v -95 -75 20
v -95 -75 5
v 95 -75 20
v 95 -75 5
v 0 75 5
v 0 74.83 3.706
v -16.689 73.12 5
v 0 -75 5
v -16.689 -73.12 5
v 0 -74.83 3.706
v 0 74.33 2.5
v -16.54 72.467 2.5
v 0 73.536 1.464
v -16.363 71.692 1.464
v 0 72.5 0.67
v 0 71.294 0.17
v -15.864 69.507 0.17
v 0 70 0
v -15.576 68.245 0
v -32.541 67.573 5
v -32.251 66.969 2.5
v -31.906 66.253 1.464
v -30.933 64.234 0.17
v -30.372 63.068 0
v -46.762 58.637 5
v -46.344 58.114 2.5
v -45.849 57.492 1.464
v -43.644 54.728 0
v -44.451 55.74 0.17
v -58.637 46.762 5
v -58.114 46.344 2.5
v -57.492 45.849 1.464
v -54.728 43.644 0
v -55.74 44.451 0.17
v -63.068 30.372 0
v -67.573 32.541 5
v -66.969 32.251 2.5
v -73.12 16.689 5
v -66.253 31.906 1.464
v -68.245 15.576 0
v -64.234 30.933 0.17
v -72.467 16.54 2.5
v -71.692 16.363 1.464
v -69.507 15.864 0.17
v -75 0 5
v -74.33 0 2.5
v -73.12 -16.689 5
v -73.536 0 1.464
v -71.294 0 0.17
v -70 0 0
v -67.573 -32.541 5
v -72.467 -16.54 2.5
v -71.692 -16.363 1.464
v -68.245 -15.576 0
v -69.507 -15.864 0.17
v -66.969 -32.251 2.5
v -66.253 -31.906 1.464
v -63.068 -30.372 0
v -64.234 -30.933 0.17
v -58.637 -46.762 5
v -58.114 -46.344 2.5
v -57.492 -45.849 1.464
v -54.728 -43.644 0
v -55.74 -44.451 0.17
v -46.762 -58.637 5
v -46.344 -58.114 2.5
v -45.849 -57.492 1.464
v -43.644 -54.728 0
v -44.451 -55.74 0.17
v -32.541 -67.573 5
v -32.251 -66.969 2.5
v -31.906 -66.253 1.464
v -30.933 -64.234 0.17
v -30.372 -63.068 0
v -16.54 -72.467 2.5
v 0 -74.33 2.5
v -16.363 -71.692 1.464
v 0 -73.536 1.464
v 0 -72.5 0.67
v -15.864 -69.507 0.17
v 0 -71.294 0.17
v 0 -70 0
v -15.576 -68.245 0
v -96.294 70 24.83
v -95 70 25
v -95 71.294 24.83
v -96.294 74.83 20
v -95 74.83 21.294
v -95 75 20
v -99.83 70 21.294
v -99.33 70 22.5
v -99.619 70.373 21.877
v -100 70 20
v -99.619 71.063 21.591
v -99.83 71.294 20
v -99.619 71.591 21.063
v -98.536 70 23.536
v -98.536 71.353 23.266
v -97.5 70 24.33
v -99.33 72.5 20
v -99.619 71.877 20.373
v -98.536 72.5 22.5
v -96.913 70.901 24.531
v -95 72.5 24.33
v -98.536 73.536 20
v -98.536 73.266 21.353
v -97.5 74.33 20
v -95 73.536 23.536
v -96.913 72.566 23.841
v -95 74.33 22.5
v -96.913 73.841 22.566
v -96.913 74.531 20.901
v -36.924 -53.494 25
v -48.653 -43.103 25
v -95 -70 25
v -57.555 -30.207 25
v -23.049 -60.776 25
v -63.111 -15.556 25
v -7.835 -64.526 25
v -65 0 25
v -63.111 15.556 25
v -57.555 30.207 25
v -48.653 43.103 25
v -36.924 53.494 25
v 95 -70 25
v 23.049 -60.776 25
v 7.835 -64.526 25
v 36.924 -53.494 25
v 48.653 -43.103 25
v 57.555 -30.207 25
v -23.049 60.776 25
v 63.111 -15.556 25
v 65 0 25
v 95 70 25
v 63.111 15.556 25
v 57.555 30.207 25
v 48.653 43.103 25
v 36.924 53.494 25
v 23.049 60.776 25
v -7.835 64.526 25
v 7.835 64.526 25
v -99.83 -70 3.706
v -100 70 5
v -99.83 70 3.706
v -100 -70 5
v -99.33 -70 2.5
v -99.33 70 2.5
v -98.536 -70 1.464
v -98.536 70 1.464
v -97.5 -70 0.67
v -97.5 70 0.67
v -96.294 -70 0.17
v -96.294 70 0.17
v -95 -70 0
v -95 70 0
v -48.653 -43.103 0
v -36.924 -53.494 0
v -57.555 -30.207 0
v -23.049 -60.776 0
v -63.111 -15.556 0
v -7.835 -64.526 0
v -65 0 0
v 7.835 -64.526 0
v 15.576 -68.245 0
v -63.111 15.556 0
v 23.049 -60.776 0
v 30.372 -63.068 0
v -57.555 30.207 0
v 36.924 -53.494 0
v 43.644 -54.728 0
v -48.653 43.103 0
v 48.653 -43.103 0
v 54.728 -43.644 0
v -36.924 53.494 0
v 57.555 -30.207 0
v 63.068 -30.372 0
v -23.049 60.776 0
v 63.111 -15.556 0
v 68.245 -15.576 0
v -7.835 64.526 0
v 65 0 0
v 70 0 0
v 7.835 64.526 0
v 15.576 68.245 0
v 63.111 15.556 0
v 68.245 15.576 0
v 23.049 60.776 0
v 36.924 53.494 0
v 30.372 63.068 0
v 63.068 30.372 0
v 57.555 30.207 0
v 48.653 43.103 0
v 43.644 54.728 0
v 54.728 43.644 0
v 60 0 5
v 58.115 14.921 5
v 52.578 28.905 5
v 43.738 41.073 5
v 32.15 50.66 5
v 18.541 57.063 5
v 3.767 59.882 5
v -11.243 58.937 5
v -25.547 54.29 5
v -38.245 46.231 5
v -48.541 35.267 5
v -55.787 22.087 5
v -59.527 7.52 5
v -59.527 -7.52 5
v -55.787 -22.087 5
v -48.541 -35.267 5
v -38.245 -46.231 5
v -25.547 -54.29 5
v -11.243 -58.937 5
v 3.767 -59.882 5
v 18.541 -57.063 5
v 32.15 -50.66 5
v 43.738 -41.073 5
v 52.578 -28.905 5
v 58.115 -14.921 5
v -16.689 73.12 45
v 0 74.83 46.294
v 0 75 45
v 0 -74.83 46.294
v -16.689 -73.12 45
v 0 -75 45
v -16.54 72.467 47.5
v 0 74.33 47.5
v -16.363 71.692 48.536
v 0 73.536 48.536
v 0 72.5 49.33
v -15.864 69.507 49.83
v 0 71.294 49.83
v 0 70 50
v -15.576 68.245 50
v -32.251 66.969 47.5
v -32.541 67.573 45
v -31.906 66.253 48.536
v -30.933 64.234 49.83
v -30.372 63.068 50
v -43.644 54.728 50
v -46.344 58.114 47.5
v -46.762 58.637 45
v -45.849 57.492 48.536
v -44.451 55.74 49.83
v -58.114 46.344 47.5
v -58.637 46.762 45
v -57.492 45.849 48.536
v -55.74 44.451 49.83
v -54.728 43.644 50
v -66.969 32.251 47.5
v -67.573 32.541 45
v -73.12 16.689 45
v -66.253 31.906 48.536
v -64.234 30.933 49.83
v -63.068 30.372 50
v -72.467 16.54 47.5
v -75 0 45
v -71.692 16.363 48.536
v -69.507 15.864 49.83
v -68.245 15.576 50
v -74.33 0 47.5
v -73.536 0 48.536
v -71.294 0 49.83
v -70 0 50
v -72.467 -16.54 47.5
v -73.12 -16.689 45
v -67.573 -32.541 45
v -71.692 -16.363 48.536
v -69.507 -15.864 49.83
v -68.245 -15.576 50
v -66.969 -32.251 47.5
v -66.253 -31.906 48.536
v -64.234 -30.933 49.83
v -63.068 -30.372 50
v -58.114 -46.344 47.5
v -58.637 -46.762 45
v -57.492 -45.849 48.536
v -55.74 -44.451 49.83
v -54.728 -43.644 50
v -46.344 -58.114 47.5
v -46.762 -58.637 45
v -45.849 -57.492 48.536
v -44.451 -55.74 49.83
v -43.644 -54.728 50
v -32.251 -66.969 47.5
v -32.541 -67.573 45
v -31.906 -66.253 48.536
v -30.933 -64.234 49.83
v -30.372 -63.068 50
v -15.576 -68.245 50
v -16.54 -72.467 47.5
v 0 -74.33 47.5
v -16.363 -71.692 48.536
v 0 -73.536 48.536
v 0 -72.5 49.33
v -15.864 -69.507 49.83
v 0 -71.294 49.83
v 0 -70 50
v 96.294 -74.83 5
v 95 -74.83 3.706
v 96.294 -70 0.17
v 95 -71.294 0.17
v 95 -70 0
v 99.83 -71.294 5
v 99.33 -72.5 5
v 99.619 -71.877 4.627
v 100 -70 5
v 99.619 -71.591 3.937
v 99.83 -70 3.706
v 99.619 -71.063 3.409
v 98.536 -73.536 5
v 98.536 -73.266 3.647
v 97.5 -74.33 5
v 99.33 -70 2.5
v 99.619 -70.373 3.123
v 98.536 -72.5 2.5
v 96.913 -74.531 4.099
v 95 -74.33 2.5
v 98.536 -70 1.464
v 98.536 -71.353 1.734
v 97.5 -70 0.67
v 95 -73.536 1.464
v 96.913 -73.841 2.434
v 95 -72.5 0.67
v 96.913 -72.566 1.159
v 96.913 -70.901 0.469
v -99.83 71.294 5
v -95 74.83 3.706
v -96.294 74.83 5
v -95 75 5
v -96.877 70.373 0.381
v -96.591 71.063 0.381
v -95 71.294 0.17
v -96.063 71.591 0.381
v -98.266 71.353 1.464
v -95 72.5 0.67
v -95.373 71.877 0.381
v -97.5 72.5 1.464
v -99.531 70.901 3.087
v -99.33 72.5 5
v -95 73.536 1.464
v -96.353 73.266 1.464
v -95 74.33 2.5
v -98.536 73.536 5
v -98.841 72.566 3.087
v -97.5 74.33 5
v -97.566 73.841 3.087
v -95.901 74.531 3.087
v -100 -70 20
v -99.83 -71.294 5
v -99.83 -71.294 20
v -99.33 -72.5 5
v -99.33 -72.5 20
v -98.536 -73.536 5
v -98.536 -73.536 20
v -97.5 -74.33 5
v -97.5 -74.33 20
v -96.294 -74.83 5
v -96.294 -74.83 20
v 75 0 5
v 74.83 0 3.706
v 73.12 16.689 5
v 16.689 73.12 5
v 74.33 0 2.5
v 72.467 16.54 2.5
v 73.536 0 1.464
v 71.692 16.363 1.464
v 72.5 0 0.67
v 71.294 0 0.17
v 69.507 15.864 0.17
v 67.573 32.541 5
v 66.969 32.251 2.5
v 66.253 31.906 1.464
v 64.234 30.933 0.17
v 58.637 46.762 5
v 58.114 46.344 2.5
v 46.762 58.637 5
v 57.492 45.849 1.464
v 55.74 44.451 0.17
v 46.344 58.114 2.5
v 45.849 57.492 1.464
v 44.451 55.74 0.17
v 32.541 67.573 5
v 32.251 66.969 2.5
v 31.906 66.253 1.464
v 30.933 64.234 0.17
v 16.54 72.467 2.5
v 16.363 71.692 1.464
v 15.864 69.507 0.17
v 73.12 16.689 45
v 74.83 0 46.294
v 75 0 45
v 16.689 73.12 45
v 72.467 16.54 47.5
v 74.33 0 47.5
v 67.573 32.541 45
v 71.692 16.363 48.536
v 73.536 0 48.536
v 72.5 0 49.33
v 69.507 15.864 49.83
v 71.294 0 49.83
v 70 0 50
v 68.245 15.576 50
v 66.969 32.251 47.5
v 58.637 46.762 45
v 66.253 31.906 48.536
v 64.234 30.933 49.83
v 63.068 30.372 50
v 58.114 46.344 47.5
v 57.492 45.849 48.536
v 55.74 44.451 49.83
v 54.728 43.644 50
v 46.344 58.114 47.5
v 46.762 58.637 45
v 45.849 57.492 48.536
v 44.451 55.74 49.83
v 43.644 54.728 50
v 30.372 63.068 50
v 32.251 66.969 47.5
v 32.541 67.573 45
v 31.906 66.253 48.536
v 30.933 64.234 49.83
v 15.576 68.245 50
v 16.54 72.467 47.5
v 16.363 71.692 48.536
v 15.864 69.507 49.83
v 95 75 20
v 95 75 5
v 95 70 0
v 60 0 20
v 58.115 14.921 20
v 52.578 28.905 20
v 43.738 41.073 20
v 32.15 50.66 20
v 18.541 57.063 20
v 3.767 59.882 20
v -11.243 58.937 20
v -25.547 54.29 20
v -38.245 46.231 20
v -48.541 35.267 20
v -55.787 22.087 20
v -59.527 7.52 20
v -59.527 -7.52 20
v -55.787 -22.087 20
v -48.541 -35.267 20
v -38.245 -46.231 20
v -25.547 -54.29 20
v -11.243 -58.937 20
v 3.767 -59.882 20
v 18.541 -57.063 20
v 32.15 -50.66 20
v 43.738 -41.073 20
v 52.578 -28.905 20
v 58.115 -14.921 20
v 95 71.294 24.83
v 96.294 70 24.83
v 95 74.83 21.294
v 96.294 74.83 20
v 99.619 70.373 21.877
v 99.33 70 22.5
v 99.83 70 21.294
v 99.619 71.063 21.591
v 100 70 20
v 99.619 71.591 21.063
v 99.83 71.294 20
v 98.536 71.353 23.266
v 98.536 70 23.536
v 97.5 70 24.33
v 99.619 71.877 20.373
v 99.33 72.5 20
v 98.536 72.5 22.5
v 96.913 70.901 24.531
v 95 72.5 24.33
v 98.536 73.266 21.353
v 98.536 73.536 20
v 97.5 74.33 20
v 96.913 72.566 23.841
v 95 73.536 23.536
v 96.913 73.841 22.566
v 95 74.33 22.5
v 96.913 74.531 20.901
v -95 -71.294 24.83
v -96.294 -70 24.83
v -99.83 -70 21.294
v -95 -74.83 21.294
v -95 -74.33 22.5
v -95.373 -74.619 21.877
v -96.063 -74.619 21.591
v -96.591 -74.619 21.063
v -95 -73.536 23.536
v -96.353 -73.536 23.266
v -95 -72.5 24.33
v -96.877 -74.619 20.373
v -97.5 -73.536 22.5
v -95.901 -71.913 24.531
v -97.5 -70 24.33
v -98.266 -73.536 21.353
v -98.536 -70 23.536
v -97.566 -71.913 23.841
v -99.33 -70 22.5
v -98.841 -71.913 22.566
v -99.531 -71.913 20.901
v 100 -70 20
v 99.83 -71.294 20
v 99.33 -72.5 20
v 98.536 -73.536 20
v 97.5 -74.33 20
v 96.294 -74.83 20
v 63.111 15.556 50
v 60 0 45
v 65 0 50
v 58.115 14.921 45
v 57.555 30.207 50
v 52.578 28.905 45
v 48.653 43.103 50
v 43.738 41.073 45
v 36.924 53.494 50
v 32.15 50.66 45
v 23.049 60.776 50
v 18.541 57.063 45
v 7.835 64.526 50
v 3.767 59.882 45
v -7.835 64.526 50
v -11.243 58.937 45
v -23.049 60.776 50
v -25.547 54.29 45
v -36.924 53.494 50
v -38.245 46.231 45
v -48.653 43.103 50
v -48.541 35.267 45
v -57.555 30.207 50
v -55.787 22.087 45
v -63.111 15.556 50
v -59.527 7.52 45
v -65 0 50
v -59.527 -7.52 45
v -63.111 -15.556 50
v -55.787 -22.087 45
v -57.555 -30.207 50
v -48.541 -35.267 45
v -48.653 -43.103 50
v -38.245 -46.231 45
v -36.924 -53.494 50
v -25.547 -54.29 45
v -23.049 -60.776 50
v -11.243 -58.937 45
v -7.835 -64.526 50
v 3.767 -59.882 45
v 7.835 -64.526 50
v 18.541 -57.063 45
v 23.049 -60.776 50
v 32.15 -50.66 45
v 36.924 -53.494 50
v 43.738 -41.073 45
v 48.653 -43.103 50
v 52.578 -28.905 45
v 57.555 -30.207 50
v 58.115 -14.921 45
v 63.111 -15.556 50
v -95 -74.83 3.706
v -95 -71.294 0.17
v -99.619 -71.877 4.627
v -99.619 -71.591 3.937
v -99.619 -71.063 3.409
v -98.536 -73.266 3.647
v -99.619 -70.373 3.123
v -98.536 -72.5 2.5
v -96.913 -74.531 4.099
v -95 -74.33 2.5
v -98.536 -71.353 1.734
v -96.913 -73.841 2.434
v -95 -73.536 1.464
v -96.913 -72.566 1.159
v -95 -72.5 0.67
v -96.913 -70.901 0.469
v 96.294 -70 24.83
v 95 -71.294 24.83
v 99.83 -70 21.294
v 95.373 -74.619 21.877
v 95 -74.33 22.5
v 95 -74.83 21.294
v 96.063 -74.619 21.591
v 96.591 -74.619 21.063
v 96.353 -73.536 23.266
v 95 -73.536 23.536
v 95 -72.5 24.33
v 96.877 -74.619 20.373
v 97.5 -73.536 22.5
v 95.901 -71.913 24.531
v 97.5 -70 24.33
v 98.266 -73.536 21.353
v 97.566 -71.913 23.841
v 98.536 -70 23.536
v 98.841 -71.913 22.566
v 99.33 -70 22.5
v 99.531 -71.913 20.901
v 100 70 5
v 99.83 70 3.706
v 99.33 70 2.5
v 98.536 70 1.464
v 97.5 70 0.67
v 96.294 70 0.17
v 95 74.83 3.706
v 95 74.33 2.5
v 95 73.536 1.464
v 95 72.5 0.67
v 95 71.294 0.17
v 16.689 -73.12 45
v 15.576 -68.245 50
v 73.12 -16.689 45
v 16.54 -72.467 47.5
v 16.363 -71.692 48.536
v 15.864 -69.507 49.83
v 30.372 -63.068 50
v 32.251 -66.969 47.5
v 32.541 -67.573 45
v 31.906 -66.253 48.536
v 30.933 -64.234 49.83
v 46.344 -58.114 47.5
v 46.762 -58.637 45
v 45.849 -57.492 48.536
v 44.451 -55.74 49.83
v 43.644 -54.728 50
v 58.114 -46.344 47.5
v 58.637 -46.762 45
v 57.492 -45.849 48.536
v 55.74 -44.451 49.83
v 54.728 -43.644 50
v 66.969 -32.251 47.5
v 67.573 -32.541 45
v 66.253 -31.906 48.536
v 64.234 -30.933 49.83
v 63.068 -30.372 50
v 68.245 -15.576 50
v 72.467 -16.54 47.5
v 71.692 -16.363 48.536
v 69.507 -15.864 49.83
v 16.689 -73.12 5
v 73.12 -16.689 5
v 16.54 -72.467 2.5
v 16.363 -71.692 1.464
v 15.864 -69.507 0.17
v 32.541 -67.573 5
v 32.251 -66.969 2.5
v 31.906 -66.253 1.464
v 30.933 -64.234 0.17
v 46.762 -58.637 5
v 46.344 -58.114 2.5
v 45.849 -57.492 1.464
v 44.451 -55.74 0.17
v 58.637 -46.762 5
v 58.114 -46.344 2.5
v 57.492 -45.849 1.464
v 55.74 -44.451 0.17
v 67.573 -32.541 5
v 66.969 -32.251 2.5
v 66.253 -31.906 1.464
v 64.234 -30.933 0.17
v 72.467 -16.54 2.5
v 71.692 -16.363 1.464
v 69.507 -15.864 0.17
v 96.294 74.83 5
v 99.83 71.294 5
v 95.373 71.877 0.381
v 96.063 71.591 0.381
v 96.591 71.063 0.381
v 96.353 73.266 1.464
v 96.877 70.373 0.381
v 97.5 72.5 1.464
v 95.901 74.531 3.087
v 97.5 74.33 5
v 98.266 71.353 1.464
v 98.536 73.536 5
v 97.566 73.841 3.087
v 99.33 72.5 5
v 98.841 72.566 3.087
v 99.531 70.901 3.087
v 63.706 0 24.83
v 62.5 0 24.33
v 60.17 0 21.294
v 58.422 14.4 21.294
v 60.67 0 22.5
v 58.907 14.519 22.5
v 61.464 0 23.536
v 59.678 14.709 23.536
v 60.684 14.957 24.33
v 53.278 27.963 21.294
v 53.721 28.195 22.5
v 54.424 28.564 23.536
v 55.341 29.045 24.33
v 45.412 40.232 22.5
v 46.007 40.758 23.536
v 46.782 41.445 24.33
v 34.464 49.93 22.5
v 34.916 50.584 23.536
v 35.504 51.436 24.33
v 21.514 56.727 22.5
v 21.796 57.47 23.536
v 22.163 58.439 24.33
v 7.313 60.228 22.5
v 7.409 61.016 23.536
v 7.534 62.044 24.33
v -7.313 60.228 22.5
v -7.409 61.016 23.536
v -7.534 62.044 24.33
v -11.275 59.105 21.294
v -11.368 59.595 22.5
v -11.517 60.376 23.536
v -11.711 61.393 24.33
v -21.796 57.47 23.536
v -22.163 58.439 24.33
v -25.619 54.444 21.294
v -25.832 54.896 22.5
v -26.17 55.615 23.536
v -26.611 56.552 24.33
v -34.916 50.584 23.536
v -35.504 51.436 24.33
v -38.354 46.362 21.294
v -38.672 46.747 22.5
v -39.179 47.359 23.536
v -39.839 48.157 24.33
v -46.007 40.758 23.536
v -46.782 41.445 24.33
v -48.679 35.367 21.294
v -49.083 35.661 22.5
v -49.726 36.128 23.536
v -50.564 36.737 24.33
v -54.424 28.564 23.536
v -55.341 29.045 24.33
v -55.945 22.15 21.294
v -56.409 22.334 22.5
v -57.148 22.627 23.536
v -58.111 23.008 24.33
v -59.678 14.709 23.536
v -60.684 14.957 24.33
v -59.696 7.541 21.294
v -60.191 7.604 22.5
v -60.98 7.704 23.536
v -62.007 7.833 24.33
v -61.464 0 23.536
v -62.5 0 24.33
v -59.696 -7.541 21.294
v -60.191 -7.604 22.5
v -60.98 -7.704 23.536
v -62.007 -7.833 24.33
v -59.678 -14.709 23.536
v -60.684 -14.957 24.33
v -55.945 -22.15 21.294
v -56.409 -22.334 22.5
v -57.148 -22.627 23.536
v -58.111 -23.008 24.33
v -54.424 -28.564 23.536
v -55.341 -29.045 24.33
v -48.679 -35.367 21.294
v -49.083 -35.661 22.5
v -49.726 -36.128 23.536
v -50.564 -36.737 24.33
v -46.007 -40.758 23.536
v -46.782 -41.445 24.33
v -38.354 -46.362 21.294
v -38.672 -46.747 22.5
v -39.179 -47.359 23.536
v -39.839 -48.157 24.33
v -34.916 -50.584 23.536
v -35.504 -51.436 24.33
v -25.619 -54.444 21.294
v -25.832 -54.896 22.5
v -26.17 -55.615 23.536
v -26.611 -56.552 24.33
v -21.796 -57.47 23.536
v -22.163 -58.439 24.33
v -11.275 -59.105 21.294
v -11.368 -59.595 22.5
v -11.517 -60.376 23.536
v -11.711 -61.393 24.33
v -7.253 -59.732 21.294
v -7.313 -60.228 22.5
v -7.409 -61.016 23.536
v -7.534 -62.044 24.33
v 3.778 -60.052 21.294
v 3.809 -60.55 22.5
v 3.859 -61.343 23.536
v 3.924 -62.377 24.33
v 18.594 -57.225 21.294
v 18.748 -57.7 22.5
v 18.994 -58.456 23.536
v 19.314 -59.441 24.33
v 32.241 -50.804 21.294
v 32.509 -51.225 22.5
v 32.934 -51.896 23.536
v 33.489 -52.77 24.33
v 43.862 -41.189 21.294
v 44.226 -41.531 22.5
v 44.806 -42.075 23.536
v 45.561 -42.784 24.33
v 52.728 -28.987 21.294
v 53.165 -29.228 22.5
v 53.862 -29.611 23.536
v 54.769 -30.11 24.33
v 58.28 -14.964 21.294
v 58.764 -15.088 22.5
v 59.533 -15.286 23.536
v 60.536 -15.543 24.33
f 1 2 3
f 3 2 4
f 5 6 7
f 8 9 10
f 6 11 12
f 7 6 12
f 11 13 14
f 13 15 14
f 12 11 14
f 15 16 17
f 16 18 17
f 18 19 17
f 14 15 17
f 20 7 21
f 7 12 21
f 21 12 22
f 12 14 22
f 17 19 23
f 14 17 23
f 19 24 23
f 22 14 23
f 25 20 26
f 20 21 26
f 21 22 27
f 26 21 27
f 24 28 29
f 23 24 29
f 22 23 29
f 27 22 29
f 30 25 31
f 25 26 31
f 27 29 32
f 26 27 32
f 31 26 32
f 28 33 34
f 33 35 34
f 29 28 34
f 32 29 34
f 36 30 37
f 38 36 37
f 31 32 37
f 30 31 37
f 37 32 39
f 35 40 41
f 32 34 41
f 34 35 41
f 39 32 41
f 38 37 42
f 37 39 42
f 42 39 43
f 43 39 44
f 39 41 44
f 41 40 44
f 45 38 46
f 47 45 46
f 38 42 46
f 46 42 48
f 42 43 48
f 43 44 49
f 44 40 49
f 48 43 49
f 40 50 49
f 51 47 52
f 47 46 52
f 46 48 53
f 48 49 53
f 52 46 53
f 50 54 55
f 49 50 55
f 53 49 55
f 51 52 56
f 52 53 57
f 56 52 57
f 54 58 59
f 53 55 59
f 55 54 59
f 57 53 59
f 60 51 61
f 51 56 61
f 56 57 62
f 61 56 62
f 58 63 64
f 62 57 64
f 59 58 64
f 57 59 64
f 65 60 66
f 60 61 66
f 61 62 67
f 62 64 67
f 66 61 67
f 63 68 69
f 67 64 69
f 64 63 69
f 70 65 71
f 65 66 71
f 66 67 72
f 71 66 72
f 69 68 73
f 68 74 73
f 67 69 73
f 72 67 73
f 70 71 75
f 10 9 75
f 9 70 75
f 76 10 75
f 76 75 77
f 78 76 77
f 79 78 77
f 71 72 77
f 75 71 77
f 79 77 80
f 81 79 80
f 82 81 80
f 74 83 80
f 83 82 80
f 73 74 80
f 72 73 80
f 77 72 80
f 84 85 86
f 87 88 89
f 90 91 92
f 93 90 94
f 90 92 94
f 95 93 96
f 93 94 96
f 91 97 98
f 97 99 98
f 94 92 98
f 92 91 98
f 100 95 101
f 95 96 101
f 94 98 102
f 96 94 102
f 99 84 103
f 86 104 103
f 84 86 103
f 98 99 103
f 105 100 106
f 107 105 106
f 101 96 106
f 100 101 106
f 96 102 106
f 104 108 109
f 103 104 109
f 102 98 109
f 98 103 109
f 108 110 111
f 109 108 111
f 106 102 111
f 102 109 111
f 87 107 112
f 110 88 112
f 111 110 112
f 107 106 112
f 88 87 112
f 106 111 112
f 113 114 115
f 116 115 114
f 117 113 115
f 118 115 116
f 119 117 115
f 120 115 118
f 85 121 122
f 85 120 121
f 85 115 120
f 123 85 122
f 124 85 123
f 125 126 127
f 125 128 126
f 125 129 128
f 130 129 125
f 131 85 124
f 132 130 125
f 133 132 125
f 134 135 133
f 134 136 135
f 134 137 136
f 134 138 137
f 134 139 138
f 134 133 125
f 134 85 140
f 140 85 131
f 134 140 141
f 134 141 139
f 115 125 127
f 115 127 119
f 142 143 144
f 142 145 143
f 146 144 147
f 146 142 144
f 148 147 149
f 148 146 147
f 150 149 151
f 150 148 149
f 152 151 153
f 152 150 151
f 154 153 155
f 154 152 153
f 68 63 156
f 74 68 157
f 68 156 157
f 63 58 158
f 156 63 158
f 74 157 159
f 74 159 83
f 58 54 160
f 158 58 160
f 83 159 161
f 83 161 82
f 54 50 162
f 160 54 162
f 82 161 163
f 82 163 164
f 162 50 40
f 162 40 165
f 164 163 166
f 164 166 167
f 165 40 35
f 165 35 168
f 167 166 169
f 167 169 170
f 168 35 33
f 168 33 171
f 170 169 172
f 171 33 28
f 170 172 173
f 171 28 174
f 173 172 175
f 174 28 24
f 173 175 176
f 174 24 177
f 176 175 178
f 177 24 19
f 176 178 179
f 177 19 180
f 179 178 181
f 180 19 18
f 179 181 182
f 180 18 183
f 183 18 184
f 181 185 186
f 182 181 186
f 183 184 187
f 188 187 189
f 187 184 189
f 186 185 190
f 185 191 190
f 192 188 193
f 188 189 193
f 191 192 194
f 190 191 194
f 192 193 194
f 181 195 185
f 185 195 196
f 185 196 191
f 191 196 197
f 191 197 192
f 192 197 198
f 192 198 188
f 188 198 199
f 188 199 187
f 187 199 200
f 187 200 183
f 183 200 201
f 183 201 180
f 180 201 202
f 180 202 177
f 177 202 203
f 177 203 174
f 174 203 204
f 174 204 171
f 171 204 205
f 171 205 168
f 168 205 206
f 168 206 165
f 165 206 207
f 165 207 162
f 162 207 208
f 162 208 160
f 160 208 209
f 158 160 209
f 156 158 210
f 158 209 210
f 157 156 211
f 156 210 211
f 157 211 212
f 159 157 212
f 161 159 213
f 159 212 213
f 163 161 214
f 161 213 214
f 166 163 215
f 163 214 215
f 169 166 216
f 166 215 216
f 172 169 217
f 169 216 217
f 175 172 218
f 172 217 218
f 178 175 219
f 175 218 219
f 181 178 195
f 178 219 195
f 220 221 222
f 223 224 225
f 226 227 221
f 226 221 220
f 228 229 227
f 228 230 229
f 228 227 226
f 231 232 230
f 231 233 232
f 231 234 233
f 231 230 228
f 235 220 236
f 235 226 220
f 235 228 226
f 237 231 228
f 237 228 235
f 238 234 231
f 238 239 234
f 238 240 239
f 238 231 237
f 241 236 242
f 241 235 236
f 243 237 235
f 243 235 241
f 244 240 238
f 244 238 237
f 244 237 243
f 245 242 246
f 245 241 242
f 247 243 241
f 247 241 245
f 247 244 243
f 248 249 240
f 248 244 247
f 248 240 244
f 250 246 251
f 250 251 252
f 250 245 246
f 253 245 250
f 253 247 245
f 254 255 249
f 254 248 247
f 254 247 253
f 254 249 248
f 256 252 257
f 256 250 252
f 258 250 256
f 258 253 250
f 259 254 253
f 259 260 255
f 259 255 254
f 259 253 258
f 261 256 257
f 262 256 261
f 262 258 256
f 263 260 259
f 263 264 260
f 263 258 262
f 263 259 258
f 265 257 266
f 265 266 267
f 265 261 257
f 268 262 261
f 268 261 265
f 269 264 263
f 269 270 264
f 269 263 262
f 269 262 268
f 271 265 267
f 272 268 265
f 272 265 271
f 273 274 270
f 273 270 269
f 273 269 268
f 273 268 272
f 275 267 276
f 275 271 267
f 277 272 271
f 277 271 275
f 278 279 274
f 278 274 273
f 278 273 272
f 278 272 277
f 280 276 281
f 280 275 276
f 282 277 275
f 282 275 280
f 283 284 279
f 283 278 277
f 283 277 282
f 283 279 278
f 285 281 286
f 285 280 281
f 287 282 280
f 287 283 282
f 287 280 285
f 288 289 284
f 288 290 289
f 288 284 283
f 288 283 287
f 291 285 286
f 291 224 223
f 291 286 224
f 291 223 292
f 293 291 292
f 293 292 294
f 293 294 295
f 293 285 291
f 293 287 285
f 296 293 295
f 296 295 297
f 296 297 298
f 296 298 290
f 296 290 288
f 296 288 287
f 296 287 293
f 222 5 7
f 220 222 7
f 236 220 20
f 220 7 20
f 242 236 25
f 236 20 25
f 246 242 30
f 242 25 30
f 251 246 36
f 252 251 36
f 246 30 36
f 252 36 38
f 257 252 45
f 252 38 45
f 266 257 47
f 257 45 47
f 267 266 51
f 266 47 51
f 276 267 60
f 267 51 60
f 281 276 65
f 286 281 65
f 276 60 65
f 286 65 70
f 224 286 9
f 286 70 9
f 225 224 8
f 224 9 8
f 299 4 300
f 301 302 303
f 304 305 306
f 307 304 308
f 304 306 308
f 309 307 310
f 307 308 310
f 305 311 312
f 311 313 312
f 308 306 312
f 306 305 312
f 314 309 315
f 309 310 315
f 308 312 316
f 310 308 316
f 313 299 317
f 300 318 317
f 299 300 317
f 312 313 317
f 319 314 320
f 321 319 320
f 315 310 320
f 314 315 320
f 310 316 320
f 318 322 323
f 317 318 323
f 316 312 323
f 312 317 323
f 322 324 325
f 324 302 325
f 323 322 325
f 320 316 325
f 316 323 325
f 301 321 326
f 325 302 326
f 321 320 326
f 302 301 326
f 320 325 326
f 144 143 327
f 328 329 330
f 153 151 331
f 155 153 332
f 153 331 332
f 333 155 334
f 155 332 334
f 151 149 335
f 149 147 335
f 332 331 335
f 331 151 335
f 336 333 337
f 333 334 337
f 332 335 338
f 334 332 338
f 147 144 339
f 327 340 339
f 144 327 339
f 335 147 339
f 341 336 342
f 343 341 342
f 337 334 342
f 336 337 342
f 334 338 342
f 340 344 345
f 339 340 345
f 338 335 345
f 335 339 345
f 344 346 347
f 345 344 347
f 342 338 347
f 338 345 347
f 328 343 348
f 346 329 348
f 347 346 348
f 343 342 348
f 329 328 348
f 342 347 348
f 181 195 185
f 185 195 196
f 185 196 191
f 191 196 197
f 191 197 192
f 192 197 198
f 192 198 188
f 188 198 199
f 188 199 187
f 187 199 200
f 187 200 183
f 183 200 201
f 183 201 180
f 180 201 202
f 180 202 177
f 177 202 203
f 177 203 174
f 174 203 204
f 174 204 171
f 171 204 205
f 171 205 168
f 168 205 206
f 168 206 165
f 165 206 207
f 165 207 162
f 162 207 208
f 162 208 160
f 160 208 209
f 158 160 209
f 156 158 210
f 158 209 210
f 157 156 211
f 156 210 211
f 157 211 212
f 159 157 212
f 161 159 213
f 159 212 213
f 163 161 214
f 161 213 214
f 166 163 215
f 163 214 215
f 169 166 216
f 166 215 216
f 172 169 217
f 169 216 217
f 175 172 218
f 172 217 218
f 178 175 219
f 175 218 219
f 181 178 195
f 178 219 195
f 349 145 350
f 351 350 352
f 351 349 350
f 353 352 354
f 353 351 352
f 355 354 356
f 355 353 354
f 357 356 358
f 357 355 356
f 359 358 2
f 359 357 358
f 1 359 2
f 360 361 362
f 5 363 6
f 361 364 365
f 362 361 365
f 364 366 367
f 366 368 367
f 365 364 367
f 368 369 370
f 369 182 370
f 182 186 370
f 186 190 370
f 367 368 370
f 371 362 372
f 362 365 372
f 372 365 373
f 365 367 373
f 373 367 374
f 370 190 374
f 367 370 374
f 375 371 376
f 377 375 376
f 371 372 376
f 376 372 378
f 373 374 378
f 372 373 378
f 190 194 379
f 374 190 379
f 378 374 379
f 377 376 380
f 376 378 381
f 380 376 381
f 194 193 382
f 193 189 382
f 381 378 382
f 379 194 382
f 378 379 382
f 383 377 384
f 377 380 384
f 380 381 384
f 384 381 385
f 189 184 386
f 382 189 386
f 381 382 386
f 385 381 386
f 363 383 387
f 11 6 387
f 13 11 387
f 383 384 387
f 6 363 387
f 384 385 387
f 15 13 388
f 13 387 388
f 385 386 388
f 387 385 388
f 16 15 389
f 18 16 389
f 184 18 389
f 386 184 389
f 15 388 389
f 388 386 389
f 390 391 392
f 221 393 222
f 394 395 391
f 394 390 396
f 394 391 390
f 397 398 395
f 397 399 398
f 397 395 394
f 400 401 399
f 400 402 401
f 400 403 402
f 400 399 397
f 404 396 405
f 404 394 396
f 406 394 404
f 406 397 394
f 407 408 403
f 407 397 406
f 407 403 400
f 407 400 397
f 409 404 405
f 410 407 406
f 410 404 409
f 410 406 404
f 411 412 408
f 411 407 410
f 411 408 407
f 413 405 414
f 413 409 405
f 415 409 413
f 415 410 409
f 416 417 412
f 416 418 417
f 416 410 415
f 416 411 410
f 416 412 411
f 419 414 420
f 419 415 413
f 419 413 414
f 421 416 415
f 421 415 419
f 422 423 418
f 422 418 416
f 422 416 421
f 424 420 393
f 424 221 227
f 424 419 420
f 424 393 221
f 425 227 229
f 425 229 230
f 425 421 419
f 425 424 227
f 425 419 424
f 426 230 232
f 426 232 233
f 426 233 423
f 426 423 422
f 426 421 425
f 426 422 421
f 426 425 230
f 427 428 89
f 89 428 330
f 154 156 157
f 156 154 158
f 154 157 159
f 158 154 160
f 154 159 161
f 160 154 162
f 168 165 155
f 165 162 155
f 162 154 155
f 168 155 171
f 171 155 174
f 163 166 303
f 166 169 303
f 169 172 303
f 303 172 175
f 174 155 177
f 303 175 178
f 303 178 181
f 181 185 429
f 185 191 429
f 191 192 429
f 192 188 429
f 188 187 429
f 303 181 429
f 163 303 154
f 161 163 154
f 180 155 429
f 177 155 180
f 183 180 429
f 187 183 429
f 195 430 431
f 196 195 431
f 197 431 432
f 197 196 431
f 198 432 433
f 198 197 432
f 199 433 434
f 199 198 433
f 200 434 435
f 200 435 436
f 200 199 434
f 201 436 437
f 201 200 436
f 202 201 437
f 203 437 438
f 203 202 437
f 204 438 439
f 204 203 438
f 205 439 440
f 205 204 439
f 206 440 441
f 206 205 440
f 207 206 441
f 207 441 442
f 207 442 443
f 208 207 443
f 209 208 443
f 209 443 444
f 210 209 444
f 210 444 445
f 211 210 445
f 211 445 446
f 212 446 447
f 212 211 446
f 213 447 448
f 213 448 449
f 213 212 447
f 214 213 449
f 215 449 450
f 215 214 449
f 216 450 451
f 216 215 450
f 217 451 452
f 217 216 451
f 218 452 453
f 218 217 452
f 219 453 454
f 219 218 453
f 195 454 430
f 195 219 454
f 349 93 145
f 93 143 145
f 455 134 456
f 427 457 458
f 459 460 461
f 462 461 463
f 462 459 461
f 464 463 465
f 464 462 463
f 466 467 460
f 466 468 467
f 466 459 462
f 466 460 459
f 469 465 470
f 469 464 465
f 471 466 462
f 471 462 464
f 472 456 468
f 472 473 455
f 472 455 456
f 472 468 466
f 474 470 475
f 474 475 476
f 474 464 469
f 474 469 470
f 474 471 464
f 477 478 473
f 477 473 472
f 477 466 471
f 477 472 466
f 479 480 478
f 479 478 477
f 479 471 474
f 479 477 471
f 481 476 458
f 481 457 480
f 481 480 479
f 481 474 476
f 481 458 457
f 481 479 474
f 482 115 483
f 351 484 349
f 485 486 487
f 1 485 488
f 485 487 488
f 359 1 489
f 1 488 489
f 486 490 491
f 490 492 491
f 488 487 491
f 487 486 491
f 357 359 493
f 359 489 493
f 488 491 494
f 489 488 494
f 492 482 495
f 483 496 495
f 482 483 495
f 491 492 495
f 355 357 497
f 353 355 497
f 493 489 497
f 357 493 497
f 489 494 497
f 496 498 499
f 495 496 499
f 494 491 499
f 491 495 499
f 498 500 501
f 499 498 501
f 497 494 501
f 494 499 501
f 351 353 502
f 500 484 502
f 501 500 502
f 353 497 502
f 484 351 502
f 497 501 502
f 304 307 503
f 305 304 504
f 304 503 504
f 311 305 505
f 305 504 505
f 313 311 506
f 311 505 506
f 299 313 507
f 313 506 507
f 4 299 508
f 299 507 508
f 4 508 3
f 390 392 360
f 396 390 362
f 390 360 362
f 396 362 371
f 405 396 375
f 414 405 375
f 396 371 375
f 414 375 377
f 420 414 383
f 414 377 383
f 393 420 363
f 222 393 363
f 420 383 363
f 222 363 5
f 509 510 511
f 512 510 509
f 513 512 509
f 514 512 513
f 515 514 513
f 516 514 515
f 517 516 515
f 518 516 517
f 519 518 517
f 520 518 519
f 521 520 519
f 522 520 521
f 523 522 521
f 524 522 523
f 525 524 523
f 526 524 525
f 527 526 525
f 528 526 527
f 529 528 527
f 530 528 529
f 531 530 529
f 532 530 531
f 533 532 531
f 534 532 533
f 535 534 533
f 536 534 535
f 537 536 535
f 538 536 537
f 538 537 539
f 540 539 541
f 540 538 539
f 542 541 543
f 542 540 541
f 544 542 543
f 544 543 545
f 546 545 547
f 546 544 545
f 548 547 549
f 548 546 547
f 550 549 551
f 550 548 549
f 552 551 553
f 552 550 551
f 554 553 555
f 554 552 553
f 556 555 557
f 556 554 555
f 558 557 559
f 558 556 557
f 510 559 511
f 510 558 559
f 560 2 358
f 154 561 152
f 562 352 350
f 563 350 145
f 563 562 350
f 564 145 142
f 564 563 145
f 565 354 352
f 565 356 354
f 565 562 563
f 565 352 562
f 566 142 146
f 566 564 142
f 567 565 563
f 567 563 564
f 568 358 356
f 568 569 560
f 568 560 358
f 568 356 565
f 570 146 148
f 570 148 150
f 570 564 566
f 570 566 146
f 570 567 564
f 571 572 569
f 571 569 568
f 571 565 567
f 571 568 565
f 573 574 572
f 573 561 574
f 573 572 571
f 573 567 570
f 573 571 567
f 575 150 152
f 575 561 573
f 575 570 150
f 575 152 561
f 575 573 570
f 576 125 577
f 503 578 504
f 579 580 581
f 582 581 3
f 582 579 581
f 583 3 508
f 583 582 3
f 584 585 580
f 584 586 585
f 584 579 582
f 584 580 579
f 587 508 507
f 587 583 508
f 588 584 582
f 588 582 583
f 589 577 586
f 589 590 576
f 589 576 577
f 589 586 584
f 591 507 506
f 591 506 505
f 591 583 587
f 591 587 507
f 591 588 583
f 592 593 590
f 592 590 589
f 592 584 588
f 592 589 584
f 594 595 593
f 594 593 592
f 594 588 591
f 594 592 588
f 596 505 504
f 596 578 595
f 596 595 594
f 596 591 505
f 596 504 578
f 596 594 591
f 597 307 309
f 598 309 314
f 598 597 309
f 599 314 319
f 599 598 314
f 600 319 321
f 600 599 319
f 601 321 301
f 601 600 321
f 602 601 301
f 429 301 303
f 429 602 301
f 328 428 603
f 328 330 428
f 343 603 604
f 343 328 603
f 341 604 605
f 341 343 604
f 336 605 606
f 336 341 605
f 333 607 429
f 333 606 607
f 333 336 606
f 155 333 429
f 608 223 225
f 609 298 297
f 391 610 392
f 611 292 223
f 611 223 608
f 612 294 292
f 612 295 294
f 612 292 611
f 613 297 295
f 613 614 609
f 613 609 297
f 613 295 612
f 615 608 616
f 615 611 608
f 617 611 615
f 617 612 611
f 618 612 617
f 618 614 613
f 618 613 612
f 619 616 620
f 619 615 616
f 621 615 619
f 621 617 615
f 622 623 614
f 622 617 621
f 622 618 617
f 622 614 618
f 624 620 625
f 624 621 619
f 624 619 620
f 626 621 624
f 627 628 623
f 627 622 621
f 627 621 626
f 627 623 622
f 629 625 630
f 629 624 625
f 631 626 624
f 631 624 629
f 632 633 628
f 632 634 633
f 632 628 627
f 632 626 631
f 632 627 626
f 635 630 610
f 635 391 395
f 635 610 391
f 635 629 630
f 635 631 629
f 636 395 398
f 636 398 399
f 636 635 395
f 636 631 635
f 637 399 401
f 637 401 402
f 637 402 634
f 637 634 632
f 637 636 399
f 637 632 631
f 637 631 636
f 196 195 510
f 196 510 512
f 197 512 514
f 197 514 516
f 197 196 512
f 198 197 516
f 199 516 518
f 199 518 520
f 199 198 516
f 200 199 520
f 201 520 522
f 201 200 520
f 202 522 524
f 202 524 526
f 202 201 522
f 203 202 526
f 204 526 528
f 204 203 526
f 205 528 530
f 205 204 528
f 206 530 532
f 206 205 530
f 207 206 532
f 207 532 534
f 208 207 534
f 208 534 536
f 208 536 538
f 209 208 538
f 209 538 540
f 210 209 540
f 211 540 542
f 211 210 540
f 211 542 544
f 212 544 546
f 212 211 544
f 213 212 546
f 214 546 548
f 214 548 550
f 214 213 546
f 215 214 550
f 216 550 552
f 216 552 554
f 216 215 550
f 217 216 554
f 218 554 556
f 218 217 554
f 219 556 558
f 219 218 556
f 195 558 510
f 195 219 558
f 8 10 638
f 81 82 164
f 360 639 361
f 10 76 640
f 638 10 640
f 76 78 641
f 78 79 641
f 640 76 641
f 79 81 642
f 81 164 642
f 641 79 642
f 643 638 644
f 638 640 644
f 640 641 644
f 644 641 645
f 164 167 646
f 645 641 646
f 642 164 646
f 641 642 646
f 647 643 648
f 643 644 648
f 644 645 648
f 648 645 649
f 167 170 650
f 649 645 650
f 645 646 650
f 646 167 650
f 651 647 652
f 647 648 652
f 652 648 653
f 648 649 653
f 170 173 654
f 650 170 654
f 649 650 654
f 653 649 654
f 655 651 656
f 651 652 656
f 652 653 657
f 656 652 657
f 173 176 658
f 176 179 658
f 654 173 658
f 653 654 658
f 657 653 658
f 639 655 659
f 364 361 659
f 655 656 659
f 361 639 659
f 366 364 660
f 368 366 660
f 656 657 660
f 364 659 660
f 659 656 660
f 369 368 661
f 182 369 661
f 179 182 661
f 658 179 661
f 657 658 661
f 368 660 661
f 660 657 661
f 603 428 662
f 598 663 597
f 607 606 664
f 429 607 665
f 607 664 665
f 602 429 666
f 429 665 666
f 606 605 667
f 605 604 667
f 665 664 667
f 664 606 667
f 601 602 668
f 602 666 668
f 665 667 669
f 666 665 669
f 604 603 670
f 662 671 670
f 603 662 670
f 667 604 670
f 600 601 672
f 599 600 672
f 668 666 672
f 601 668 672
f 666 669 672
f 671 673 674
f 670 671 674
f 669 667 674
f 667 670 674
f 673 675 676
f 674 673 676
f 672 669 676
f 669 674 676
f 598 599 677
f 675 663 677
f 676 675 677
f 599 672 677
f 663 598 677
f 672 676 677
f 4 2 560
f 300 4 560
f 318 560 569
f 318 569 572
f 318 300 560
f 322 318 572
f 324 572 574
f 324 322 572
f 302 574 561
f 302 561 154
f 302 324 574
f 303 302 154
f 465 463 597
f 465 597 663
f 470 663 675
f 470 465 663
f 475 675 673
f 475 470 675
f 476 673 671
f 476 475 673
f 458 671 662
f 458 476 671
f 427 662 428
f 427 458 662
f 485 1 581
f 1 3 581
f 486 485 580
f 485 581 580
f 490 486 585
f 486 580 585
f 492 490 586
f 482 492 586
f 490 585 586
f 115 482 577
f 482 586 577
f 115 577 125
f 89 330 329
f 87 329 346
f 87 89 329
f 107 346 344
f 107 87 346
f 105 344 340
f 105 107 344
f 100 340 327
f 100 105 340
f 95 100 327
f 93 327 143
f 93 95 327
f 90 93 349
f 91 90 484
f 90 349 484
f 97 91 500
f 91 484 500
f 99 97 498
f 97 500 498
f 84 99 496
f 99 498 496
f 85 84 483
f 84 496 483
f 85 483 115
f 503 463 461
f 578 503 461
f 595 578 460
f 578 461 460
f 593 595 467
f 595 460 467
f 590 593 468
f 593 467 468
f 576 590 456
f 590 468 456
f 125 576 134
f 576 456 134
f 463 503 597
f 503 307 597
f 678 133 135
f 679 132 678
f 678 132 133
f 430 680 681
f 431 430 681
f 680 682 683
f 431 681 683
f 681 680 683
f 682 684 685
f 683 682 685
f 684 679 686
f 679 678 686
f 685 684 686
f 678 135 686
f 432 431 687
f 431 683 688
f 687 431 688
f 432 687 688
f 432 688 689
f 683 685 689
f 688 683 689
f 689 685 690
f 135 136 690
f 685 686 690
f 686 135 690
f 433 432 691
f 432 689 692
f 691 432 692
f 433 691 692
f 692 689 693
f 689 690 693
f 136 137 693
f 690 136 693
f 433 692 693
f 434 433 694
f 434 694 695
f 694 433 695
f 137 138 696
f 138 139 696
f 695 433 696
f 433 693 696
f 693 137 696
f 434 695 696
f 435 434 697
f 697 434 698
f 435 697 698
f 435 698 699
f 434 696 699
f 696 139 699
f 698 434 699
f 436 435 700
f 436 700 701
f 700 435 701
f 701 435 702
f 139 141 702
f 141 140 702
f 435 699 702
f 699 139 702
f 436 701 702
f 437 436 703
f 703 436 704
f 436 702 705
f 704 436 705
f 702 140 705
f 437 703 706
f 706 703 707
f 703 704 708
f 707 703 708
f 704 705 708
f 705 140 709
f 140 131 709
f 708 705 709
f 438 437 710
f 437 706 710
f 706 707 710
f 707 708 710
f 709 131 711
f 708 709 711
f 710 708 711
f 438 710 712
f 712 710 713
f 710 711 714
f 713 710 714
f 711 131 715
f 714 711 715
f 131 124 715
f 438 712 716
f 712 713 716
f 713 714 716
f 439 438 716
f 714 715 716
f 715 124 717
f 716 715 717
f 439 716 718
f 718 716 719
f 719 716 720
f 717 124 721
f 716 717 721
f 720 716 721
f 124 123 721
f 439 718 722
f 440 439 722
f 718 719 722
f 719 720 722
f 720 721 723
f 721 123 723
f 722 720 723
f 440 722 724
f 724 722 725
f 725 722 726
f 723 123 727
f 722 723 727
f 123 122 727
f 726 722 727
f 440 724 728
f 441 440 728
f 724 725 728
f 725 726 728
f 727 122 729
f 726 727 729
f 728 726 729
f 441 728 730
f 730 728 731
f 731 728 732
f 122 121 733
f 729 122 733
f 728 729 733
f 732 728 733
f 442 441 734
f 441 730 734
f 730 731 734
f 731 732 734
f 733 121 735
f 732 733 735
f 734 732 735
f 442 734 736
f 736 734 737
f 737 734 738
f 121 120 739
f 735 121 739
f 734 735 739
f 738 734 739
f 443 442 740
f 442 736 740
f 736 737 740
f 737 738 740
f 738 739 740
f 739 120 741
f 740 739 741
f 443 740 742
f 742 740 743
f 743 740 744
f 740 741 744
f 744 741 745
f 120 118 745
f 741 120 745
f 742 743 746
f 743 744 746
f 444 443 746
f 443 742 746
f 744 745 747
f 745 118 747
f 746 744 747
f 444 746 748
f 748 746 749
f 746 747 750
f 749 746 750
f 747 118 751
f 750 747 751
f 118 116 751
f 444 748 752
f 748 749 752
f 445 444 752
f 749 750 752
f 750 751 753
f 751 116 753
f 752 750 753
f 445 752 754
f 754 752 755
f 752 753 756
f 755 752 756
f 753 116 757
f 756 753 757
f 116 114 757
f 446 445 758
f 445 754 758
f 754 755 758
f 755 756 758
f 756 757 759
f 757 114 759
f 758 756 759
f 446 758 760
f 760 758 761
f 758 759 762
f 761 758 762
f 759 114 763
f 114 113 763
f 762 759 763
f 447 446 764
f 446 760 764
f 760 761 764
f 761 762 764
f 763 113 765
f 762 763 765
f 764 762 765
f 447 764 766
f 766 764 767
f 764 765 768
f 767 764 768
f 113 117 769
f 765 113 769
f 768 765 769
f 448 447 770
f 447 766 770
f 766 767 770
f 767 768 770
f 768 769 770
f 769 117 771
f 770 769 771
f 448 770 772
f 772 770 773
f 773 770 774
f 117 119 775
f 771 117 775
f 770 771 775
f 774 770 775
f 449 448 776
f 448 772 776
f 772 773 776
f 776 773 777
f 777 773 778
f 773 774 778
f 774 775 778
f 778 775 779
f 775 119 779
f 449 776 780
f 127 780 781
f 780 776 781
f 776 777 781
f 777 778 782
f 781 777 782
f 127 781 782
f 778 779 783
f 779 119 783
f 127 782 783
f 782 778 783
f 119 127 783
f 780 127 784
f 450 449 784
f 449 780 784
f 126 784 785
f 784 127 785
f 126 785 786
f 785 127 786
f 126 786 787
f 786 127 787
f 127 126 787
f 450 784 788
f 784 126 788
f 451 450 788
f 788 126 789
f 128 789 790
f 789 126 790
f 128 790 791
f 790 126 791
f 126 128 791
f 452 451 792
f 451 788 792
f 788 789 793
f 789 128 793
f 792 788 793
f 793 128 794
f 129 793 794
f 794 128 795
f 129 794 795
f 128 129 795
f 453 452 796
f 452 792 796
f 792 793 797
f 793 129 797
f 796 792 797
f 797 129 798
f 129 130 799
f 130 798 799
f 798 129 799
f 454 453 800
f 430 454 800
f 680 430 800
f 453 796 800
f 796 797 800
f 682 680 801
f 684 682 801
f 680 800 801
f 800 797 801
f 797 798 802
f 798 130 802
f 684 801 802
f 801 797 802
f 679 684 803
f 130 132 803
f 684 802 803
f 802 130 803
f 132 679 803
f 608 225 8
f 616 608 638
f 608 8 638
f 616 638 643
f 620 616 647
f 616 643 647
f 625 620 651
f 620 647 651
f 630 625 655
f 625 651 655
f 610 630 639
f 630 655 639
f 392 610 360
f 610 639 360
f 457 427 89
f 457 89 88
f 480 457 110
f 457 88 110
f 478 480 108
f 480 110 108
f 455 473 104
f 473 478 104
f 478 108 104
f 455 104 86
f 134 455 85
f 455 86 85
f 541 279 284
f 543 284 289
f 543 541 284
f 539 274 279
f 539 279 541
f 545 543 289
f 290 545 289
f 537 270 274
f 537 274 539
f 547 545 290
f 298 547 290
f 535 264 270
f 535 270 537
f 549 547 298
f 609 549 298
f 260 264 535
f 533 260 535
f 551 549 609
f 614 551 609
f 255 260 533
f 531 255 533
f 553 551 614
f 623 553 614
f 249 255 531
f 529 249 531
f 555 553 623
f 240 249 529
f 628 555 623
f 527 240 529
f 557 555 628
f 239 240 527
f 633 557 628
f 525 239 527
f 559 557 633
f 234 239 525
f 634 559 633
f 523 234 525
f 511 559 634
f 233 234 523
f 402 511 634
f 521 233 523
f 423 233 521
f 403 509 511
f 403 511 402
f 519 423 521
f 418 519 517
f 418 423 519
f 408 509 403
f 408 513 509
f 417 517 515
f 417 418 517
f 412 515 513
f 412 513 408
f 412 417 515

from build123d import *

# Parameters (mm, degrees)
F0_R      = 60
F1_DEPTH  = 50
F2_DEPTH  = 25
F3_R      = 5
F3_2_R    = 5
F4_SIZE   = 5
F4_2_SIZE = 5


with BuildPart() as f1:
    # F0 (on Top) → F1 (new body)
    with BuildSketch(Plane.XY):
        with BuildLine():
            ThreePointArc((-3.096e-07, -75), (53.0330084795, -53.0330086984), (75, 0))
            ThreePointArc((75, 0), (53.0330084621, 53.0330087158), (-3.588e-07, 75))
            ThreePointArc((-3.588e-07, 75), (-75, -2.46e-08), (-3.096e-07, -75))
        make_face()
        Circle(F0_R, mode=Mode.SUBTRACT)
    extrude(amount=F1_DEPTH)

    # F3
    f3_edges = [f1.edges().sort_by_distance(p)[0] for p in [
        (0, -75, 0),
        (0, 75, 25),
        (0, -75, 50),
    ]]
    fillet(f3_edges, radius=F3_R)

    # F4#2
    f4_2_edges = [f1.edges().sort_by_distance(p)[0] for p in [
        (-60, 0, 0),
        (60, 0, 25),
        (-60, 0, 50),
    ]]
    chamfer(f4_2_edges, length=F4_2_SIZE)


with BuildPart() as f2:
    # F0 (on Top) → F2 (new body)
    with BuildSketch(Plane.XY):
        with BuildLine():
            ThreePointArc((-3.096e-07, -75), (53.0330084795, -53.0330086984), (75, 0))
            ThreePointArc((75, 0), (53.0330084621, 53.0330087158), (-3.588e-07, 75))
            ThreePointArc((-3.588e-07, 75), (-75, -2.46e-08), (-3.096e-07, -75))
        make_face()
        Circle(F0_R, mode=Mode.SUBTRACT)
        with BuildLine():
            ThreePointArc((-3.588e-07, 75), (53.0330084621, 53.0330087158), (75, 0))
            ThreePointArc((75, 0), (53.0330084795, -53.0330086984), (-3.096e-07, -75))
            Line((-3.096e-07, -75), (100, -75))
            Line((100, -75), (100, 75))
            Line((100, 75), (-3.588e-07, 75))
        make_face()
        with BuildLine():
            ThreePointArc((-3.096e-07, -75), (-75, -2.46e-08), (-3.588e-07, 75))
            Line((-3.588e-07, 75), (-100, 75))
            Line((-100, 75), (-100, -75))
            Line((-100, -75), (-3.096e-07, -75))
        make_face()
    extrude(amount=F2_DEPTH)

    # F3#2
    f3_2_edges = [f2.edges().sort_by_distance(p)[0] for p in [
        (0, -75, 0),
        (0, 75, 25),
        (100, 0, 25),
        (-100, 0, 25),
        (0, -75, 25),
        (-60, 0, 25),
        (-100, 75, 12.5),
        (-100, -75, 12.5),
        (-100, 0, 0),
        (100, 75, 12.5),
        (0, 75, 0),
        (100, -75, 12.5),
        (100, 0, 0),
    ]]
    fillet(f3_2_edges, radius=F3_2_R)

    # F4
    f4_edges = [f2.edges().sort_by_distance(p)[0] for p in [
        (-60, 0, 0),
    ]]
    chamfer(f4_edges, length=F4_SIZE)


solid = Compound([f1.part, f2.part])
